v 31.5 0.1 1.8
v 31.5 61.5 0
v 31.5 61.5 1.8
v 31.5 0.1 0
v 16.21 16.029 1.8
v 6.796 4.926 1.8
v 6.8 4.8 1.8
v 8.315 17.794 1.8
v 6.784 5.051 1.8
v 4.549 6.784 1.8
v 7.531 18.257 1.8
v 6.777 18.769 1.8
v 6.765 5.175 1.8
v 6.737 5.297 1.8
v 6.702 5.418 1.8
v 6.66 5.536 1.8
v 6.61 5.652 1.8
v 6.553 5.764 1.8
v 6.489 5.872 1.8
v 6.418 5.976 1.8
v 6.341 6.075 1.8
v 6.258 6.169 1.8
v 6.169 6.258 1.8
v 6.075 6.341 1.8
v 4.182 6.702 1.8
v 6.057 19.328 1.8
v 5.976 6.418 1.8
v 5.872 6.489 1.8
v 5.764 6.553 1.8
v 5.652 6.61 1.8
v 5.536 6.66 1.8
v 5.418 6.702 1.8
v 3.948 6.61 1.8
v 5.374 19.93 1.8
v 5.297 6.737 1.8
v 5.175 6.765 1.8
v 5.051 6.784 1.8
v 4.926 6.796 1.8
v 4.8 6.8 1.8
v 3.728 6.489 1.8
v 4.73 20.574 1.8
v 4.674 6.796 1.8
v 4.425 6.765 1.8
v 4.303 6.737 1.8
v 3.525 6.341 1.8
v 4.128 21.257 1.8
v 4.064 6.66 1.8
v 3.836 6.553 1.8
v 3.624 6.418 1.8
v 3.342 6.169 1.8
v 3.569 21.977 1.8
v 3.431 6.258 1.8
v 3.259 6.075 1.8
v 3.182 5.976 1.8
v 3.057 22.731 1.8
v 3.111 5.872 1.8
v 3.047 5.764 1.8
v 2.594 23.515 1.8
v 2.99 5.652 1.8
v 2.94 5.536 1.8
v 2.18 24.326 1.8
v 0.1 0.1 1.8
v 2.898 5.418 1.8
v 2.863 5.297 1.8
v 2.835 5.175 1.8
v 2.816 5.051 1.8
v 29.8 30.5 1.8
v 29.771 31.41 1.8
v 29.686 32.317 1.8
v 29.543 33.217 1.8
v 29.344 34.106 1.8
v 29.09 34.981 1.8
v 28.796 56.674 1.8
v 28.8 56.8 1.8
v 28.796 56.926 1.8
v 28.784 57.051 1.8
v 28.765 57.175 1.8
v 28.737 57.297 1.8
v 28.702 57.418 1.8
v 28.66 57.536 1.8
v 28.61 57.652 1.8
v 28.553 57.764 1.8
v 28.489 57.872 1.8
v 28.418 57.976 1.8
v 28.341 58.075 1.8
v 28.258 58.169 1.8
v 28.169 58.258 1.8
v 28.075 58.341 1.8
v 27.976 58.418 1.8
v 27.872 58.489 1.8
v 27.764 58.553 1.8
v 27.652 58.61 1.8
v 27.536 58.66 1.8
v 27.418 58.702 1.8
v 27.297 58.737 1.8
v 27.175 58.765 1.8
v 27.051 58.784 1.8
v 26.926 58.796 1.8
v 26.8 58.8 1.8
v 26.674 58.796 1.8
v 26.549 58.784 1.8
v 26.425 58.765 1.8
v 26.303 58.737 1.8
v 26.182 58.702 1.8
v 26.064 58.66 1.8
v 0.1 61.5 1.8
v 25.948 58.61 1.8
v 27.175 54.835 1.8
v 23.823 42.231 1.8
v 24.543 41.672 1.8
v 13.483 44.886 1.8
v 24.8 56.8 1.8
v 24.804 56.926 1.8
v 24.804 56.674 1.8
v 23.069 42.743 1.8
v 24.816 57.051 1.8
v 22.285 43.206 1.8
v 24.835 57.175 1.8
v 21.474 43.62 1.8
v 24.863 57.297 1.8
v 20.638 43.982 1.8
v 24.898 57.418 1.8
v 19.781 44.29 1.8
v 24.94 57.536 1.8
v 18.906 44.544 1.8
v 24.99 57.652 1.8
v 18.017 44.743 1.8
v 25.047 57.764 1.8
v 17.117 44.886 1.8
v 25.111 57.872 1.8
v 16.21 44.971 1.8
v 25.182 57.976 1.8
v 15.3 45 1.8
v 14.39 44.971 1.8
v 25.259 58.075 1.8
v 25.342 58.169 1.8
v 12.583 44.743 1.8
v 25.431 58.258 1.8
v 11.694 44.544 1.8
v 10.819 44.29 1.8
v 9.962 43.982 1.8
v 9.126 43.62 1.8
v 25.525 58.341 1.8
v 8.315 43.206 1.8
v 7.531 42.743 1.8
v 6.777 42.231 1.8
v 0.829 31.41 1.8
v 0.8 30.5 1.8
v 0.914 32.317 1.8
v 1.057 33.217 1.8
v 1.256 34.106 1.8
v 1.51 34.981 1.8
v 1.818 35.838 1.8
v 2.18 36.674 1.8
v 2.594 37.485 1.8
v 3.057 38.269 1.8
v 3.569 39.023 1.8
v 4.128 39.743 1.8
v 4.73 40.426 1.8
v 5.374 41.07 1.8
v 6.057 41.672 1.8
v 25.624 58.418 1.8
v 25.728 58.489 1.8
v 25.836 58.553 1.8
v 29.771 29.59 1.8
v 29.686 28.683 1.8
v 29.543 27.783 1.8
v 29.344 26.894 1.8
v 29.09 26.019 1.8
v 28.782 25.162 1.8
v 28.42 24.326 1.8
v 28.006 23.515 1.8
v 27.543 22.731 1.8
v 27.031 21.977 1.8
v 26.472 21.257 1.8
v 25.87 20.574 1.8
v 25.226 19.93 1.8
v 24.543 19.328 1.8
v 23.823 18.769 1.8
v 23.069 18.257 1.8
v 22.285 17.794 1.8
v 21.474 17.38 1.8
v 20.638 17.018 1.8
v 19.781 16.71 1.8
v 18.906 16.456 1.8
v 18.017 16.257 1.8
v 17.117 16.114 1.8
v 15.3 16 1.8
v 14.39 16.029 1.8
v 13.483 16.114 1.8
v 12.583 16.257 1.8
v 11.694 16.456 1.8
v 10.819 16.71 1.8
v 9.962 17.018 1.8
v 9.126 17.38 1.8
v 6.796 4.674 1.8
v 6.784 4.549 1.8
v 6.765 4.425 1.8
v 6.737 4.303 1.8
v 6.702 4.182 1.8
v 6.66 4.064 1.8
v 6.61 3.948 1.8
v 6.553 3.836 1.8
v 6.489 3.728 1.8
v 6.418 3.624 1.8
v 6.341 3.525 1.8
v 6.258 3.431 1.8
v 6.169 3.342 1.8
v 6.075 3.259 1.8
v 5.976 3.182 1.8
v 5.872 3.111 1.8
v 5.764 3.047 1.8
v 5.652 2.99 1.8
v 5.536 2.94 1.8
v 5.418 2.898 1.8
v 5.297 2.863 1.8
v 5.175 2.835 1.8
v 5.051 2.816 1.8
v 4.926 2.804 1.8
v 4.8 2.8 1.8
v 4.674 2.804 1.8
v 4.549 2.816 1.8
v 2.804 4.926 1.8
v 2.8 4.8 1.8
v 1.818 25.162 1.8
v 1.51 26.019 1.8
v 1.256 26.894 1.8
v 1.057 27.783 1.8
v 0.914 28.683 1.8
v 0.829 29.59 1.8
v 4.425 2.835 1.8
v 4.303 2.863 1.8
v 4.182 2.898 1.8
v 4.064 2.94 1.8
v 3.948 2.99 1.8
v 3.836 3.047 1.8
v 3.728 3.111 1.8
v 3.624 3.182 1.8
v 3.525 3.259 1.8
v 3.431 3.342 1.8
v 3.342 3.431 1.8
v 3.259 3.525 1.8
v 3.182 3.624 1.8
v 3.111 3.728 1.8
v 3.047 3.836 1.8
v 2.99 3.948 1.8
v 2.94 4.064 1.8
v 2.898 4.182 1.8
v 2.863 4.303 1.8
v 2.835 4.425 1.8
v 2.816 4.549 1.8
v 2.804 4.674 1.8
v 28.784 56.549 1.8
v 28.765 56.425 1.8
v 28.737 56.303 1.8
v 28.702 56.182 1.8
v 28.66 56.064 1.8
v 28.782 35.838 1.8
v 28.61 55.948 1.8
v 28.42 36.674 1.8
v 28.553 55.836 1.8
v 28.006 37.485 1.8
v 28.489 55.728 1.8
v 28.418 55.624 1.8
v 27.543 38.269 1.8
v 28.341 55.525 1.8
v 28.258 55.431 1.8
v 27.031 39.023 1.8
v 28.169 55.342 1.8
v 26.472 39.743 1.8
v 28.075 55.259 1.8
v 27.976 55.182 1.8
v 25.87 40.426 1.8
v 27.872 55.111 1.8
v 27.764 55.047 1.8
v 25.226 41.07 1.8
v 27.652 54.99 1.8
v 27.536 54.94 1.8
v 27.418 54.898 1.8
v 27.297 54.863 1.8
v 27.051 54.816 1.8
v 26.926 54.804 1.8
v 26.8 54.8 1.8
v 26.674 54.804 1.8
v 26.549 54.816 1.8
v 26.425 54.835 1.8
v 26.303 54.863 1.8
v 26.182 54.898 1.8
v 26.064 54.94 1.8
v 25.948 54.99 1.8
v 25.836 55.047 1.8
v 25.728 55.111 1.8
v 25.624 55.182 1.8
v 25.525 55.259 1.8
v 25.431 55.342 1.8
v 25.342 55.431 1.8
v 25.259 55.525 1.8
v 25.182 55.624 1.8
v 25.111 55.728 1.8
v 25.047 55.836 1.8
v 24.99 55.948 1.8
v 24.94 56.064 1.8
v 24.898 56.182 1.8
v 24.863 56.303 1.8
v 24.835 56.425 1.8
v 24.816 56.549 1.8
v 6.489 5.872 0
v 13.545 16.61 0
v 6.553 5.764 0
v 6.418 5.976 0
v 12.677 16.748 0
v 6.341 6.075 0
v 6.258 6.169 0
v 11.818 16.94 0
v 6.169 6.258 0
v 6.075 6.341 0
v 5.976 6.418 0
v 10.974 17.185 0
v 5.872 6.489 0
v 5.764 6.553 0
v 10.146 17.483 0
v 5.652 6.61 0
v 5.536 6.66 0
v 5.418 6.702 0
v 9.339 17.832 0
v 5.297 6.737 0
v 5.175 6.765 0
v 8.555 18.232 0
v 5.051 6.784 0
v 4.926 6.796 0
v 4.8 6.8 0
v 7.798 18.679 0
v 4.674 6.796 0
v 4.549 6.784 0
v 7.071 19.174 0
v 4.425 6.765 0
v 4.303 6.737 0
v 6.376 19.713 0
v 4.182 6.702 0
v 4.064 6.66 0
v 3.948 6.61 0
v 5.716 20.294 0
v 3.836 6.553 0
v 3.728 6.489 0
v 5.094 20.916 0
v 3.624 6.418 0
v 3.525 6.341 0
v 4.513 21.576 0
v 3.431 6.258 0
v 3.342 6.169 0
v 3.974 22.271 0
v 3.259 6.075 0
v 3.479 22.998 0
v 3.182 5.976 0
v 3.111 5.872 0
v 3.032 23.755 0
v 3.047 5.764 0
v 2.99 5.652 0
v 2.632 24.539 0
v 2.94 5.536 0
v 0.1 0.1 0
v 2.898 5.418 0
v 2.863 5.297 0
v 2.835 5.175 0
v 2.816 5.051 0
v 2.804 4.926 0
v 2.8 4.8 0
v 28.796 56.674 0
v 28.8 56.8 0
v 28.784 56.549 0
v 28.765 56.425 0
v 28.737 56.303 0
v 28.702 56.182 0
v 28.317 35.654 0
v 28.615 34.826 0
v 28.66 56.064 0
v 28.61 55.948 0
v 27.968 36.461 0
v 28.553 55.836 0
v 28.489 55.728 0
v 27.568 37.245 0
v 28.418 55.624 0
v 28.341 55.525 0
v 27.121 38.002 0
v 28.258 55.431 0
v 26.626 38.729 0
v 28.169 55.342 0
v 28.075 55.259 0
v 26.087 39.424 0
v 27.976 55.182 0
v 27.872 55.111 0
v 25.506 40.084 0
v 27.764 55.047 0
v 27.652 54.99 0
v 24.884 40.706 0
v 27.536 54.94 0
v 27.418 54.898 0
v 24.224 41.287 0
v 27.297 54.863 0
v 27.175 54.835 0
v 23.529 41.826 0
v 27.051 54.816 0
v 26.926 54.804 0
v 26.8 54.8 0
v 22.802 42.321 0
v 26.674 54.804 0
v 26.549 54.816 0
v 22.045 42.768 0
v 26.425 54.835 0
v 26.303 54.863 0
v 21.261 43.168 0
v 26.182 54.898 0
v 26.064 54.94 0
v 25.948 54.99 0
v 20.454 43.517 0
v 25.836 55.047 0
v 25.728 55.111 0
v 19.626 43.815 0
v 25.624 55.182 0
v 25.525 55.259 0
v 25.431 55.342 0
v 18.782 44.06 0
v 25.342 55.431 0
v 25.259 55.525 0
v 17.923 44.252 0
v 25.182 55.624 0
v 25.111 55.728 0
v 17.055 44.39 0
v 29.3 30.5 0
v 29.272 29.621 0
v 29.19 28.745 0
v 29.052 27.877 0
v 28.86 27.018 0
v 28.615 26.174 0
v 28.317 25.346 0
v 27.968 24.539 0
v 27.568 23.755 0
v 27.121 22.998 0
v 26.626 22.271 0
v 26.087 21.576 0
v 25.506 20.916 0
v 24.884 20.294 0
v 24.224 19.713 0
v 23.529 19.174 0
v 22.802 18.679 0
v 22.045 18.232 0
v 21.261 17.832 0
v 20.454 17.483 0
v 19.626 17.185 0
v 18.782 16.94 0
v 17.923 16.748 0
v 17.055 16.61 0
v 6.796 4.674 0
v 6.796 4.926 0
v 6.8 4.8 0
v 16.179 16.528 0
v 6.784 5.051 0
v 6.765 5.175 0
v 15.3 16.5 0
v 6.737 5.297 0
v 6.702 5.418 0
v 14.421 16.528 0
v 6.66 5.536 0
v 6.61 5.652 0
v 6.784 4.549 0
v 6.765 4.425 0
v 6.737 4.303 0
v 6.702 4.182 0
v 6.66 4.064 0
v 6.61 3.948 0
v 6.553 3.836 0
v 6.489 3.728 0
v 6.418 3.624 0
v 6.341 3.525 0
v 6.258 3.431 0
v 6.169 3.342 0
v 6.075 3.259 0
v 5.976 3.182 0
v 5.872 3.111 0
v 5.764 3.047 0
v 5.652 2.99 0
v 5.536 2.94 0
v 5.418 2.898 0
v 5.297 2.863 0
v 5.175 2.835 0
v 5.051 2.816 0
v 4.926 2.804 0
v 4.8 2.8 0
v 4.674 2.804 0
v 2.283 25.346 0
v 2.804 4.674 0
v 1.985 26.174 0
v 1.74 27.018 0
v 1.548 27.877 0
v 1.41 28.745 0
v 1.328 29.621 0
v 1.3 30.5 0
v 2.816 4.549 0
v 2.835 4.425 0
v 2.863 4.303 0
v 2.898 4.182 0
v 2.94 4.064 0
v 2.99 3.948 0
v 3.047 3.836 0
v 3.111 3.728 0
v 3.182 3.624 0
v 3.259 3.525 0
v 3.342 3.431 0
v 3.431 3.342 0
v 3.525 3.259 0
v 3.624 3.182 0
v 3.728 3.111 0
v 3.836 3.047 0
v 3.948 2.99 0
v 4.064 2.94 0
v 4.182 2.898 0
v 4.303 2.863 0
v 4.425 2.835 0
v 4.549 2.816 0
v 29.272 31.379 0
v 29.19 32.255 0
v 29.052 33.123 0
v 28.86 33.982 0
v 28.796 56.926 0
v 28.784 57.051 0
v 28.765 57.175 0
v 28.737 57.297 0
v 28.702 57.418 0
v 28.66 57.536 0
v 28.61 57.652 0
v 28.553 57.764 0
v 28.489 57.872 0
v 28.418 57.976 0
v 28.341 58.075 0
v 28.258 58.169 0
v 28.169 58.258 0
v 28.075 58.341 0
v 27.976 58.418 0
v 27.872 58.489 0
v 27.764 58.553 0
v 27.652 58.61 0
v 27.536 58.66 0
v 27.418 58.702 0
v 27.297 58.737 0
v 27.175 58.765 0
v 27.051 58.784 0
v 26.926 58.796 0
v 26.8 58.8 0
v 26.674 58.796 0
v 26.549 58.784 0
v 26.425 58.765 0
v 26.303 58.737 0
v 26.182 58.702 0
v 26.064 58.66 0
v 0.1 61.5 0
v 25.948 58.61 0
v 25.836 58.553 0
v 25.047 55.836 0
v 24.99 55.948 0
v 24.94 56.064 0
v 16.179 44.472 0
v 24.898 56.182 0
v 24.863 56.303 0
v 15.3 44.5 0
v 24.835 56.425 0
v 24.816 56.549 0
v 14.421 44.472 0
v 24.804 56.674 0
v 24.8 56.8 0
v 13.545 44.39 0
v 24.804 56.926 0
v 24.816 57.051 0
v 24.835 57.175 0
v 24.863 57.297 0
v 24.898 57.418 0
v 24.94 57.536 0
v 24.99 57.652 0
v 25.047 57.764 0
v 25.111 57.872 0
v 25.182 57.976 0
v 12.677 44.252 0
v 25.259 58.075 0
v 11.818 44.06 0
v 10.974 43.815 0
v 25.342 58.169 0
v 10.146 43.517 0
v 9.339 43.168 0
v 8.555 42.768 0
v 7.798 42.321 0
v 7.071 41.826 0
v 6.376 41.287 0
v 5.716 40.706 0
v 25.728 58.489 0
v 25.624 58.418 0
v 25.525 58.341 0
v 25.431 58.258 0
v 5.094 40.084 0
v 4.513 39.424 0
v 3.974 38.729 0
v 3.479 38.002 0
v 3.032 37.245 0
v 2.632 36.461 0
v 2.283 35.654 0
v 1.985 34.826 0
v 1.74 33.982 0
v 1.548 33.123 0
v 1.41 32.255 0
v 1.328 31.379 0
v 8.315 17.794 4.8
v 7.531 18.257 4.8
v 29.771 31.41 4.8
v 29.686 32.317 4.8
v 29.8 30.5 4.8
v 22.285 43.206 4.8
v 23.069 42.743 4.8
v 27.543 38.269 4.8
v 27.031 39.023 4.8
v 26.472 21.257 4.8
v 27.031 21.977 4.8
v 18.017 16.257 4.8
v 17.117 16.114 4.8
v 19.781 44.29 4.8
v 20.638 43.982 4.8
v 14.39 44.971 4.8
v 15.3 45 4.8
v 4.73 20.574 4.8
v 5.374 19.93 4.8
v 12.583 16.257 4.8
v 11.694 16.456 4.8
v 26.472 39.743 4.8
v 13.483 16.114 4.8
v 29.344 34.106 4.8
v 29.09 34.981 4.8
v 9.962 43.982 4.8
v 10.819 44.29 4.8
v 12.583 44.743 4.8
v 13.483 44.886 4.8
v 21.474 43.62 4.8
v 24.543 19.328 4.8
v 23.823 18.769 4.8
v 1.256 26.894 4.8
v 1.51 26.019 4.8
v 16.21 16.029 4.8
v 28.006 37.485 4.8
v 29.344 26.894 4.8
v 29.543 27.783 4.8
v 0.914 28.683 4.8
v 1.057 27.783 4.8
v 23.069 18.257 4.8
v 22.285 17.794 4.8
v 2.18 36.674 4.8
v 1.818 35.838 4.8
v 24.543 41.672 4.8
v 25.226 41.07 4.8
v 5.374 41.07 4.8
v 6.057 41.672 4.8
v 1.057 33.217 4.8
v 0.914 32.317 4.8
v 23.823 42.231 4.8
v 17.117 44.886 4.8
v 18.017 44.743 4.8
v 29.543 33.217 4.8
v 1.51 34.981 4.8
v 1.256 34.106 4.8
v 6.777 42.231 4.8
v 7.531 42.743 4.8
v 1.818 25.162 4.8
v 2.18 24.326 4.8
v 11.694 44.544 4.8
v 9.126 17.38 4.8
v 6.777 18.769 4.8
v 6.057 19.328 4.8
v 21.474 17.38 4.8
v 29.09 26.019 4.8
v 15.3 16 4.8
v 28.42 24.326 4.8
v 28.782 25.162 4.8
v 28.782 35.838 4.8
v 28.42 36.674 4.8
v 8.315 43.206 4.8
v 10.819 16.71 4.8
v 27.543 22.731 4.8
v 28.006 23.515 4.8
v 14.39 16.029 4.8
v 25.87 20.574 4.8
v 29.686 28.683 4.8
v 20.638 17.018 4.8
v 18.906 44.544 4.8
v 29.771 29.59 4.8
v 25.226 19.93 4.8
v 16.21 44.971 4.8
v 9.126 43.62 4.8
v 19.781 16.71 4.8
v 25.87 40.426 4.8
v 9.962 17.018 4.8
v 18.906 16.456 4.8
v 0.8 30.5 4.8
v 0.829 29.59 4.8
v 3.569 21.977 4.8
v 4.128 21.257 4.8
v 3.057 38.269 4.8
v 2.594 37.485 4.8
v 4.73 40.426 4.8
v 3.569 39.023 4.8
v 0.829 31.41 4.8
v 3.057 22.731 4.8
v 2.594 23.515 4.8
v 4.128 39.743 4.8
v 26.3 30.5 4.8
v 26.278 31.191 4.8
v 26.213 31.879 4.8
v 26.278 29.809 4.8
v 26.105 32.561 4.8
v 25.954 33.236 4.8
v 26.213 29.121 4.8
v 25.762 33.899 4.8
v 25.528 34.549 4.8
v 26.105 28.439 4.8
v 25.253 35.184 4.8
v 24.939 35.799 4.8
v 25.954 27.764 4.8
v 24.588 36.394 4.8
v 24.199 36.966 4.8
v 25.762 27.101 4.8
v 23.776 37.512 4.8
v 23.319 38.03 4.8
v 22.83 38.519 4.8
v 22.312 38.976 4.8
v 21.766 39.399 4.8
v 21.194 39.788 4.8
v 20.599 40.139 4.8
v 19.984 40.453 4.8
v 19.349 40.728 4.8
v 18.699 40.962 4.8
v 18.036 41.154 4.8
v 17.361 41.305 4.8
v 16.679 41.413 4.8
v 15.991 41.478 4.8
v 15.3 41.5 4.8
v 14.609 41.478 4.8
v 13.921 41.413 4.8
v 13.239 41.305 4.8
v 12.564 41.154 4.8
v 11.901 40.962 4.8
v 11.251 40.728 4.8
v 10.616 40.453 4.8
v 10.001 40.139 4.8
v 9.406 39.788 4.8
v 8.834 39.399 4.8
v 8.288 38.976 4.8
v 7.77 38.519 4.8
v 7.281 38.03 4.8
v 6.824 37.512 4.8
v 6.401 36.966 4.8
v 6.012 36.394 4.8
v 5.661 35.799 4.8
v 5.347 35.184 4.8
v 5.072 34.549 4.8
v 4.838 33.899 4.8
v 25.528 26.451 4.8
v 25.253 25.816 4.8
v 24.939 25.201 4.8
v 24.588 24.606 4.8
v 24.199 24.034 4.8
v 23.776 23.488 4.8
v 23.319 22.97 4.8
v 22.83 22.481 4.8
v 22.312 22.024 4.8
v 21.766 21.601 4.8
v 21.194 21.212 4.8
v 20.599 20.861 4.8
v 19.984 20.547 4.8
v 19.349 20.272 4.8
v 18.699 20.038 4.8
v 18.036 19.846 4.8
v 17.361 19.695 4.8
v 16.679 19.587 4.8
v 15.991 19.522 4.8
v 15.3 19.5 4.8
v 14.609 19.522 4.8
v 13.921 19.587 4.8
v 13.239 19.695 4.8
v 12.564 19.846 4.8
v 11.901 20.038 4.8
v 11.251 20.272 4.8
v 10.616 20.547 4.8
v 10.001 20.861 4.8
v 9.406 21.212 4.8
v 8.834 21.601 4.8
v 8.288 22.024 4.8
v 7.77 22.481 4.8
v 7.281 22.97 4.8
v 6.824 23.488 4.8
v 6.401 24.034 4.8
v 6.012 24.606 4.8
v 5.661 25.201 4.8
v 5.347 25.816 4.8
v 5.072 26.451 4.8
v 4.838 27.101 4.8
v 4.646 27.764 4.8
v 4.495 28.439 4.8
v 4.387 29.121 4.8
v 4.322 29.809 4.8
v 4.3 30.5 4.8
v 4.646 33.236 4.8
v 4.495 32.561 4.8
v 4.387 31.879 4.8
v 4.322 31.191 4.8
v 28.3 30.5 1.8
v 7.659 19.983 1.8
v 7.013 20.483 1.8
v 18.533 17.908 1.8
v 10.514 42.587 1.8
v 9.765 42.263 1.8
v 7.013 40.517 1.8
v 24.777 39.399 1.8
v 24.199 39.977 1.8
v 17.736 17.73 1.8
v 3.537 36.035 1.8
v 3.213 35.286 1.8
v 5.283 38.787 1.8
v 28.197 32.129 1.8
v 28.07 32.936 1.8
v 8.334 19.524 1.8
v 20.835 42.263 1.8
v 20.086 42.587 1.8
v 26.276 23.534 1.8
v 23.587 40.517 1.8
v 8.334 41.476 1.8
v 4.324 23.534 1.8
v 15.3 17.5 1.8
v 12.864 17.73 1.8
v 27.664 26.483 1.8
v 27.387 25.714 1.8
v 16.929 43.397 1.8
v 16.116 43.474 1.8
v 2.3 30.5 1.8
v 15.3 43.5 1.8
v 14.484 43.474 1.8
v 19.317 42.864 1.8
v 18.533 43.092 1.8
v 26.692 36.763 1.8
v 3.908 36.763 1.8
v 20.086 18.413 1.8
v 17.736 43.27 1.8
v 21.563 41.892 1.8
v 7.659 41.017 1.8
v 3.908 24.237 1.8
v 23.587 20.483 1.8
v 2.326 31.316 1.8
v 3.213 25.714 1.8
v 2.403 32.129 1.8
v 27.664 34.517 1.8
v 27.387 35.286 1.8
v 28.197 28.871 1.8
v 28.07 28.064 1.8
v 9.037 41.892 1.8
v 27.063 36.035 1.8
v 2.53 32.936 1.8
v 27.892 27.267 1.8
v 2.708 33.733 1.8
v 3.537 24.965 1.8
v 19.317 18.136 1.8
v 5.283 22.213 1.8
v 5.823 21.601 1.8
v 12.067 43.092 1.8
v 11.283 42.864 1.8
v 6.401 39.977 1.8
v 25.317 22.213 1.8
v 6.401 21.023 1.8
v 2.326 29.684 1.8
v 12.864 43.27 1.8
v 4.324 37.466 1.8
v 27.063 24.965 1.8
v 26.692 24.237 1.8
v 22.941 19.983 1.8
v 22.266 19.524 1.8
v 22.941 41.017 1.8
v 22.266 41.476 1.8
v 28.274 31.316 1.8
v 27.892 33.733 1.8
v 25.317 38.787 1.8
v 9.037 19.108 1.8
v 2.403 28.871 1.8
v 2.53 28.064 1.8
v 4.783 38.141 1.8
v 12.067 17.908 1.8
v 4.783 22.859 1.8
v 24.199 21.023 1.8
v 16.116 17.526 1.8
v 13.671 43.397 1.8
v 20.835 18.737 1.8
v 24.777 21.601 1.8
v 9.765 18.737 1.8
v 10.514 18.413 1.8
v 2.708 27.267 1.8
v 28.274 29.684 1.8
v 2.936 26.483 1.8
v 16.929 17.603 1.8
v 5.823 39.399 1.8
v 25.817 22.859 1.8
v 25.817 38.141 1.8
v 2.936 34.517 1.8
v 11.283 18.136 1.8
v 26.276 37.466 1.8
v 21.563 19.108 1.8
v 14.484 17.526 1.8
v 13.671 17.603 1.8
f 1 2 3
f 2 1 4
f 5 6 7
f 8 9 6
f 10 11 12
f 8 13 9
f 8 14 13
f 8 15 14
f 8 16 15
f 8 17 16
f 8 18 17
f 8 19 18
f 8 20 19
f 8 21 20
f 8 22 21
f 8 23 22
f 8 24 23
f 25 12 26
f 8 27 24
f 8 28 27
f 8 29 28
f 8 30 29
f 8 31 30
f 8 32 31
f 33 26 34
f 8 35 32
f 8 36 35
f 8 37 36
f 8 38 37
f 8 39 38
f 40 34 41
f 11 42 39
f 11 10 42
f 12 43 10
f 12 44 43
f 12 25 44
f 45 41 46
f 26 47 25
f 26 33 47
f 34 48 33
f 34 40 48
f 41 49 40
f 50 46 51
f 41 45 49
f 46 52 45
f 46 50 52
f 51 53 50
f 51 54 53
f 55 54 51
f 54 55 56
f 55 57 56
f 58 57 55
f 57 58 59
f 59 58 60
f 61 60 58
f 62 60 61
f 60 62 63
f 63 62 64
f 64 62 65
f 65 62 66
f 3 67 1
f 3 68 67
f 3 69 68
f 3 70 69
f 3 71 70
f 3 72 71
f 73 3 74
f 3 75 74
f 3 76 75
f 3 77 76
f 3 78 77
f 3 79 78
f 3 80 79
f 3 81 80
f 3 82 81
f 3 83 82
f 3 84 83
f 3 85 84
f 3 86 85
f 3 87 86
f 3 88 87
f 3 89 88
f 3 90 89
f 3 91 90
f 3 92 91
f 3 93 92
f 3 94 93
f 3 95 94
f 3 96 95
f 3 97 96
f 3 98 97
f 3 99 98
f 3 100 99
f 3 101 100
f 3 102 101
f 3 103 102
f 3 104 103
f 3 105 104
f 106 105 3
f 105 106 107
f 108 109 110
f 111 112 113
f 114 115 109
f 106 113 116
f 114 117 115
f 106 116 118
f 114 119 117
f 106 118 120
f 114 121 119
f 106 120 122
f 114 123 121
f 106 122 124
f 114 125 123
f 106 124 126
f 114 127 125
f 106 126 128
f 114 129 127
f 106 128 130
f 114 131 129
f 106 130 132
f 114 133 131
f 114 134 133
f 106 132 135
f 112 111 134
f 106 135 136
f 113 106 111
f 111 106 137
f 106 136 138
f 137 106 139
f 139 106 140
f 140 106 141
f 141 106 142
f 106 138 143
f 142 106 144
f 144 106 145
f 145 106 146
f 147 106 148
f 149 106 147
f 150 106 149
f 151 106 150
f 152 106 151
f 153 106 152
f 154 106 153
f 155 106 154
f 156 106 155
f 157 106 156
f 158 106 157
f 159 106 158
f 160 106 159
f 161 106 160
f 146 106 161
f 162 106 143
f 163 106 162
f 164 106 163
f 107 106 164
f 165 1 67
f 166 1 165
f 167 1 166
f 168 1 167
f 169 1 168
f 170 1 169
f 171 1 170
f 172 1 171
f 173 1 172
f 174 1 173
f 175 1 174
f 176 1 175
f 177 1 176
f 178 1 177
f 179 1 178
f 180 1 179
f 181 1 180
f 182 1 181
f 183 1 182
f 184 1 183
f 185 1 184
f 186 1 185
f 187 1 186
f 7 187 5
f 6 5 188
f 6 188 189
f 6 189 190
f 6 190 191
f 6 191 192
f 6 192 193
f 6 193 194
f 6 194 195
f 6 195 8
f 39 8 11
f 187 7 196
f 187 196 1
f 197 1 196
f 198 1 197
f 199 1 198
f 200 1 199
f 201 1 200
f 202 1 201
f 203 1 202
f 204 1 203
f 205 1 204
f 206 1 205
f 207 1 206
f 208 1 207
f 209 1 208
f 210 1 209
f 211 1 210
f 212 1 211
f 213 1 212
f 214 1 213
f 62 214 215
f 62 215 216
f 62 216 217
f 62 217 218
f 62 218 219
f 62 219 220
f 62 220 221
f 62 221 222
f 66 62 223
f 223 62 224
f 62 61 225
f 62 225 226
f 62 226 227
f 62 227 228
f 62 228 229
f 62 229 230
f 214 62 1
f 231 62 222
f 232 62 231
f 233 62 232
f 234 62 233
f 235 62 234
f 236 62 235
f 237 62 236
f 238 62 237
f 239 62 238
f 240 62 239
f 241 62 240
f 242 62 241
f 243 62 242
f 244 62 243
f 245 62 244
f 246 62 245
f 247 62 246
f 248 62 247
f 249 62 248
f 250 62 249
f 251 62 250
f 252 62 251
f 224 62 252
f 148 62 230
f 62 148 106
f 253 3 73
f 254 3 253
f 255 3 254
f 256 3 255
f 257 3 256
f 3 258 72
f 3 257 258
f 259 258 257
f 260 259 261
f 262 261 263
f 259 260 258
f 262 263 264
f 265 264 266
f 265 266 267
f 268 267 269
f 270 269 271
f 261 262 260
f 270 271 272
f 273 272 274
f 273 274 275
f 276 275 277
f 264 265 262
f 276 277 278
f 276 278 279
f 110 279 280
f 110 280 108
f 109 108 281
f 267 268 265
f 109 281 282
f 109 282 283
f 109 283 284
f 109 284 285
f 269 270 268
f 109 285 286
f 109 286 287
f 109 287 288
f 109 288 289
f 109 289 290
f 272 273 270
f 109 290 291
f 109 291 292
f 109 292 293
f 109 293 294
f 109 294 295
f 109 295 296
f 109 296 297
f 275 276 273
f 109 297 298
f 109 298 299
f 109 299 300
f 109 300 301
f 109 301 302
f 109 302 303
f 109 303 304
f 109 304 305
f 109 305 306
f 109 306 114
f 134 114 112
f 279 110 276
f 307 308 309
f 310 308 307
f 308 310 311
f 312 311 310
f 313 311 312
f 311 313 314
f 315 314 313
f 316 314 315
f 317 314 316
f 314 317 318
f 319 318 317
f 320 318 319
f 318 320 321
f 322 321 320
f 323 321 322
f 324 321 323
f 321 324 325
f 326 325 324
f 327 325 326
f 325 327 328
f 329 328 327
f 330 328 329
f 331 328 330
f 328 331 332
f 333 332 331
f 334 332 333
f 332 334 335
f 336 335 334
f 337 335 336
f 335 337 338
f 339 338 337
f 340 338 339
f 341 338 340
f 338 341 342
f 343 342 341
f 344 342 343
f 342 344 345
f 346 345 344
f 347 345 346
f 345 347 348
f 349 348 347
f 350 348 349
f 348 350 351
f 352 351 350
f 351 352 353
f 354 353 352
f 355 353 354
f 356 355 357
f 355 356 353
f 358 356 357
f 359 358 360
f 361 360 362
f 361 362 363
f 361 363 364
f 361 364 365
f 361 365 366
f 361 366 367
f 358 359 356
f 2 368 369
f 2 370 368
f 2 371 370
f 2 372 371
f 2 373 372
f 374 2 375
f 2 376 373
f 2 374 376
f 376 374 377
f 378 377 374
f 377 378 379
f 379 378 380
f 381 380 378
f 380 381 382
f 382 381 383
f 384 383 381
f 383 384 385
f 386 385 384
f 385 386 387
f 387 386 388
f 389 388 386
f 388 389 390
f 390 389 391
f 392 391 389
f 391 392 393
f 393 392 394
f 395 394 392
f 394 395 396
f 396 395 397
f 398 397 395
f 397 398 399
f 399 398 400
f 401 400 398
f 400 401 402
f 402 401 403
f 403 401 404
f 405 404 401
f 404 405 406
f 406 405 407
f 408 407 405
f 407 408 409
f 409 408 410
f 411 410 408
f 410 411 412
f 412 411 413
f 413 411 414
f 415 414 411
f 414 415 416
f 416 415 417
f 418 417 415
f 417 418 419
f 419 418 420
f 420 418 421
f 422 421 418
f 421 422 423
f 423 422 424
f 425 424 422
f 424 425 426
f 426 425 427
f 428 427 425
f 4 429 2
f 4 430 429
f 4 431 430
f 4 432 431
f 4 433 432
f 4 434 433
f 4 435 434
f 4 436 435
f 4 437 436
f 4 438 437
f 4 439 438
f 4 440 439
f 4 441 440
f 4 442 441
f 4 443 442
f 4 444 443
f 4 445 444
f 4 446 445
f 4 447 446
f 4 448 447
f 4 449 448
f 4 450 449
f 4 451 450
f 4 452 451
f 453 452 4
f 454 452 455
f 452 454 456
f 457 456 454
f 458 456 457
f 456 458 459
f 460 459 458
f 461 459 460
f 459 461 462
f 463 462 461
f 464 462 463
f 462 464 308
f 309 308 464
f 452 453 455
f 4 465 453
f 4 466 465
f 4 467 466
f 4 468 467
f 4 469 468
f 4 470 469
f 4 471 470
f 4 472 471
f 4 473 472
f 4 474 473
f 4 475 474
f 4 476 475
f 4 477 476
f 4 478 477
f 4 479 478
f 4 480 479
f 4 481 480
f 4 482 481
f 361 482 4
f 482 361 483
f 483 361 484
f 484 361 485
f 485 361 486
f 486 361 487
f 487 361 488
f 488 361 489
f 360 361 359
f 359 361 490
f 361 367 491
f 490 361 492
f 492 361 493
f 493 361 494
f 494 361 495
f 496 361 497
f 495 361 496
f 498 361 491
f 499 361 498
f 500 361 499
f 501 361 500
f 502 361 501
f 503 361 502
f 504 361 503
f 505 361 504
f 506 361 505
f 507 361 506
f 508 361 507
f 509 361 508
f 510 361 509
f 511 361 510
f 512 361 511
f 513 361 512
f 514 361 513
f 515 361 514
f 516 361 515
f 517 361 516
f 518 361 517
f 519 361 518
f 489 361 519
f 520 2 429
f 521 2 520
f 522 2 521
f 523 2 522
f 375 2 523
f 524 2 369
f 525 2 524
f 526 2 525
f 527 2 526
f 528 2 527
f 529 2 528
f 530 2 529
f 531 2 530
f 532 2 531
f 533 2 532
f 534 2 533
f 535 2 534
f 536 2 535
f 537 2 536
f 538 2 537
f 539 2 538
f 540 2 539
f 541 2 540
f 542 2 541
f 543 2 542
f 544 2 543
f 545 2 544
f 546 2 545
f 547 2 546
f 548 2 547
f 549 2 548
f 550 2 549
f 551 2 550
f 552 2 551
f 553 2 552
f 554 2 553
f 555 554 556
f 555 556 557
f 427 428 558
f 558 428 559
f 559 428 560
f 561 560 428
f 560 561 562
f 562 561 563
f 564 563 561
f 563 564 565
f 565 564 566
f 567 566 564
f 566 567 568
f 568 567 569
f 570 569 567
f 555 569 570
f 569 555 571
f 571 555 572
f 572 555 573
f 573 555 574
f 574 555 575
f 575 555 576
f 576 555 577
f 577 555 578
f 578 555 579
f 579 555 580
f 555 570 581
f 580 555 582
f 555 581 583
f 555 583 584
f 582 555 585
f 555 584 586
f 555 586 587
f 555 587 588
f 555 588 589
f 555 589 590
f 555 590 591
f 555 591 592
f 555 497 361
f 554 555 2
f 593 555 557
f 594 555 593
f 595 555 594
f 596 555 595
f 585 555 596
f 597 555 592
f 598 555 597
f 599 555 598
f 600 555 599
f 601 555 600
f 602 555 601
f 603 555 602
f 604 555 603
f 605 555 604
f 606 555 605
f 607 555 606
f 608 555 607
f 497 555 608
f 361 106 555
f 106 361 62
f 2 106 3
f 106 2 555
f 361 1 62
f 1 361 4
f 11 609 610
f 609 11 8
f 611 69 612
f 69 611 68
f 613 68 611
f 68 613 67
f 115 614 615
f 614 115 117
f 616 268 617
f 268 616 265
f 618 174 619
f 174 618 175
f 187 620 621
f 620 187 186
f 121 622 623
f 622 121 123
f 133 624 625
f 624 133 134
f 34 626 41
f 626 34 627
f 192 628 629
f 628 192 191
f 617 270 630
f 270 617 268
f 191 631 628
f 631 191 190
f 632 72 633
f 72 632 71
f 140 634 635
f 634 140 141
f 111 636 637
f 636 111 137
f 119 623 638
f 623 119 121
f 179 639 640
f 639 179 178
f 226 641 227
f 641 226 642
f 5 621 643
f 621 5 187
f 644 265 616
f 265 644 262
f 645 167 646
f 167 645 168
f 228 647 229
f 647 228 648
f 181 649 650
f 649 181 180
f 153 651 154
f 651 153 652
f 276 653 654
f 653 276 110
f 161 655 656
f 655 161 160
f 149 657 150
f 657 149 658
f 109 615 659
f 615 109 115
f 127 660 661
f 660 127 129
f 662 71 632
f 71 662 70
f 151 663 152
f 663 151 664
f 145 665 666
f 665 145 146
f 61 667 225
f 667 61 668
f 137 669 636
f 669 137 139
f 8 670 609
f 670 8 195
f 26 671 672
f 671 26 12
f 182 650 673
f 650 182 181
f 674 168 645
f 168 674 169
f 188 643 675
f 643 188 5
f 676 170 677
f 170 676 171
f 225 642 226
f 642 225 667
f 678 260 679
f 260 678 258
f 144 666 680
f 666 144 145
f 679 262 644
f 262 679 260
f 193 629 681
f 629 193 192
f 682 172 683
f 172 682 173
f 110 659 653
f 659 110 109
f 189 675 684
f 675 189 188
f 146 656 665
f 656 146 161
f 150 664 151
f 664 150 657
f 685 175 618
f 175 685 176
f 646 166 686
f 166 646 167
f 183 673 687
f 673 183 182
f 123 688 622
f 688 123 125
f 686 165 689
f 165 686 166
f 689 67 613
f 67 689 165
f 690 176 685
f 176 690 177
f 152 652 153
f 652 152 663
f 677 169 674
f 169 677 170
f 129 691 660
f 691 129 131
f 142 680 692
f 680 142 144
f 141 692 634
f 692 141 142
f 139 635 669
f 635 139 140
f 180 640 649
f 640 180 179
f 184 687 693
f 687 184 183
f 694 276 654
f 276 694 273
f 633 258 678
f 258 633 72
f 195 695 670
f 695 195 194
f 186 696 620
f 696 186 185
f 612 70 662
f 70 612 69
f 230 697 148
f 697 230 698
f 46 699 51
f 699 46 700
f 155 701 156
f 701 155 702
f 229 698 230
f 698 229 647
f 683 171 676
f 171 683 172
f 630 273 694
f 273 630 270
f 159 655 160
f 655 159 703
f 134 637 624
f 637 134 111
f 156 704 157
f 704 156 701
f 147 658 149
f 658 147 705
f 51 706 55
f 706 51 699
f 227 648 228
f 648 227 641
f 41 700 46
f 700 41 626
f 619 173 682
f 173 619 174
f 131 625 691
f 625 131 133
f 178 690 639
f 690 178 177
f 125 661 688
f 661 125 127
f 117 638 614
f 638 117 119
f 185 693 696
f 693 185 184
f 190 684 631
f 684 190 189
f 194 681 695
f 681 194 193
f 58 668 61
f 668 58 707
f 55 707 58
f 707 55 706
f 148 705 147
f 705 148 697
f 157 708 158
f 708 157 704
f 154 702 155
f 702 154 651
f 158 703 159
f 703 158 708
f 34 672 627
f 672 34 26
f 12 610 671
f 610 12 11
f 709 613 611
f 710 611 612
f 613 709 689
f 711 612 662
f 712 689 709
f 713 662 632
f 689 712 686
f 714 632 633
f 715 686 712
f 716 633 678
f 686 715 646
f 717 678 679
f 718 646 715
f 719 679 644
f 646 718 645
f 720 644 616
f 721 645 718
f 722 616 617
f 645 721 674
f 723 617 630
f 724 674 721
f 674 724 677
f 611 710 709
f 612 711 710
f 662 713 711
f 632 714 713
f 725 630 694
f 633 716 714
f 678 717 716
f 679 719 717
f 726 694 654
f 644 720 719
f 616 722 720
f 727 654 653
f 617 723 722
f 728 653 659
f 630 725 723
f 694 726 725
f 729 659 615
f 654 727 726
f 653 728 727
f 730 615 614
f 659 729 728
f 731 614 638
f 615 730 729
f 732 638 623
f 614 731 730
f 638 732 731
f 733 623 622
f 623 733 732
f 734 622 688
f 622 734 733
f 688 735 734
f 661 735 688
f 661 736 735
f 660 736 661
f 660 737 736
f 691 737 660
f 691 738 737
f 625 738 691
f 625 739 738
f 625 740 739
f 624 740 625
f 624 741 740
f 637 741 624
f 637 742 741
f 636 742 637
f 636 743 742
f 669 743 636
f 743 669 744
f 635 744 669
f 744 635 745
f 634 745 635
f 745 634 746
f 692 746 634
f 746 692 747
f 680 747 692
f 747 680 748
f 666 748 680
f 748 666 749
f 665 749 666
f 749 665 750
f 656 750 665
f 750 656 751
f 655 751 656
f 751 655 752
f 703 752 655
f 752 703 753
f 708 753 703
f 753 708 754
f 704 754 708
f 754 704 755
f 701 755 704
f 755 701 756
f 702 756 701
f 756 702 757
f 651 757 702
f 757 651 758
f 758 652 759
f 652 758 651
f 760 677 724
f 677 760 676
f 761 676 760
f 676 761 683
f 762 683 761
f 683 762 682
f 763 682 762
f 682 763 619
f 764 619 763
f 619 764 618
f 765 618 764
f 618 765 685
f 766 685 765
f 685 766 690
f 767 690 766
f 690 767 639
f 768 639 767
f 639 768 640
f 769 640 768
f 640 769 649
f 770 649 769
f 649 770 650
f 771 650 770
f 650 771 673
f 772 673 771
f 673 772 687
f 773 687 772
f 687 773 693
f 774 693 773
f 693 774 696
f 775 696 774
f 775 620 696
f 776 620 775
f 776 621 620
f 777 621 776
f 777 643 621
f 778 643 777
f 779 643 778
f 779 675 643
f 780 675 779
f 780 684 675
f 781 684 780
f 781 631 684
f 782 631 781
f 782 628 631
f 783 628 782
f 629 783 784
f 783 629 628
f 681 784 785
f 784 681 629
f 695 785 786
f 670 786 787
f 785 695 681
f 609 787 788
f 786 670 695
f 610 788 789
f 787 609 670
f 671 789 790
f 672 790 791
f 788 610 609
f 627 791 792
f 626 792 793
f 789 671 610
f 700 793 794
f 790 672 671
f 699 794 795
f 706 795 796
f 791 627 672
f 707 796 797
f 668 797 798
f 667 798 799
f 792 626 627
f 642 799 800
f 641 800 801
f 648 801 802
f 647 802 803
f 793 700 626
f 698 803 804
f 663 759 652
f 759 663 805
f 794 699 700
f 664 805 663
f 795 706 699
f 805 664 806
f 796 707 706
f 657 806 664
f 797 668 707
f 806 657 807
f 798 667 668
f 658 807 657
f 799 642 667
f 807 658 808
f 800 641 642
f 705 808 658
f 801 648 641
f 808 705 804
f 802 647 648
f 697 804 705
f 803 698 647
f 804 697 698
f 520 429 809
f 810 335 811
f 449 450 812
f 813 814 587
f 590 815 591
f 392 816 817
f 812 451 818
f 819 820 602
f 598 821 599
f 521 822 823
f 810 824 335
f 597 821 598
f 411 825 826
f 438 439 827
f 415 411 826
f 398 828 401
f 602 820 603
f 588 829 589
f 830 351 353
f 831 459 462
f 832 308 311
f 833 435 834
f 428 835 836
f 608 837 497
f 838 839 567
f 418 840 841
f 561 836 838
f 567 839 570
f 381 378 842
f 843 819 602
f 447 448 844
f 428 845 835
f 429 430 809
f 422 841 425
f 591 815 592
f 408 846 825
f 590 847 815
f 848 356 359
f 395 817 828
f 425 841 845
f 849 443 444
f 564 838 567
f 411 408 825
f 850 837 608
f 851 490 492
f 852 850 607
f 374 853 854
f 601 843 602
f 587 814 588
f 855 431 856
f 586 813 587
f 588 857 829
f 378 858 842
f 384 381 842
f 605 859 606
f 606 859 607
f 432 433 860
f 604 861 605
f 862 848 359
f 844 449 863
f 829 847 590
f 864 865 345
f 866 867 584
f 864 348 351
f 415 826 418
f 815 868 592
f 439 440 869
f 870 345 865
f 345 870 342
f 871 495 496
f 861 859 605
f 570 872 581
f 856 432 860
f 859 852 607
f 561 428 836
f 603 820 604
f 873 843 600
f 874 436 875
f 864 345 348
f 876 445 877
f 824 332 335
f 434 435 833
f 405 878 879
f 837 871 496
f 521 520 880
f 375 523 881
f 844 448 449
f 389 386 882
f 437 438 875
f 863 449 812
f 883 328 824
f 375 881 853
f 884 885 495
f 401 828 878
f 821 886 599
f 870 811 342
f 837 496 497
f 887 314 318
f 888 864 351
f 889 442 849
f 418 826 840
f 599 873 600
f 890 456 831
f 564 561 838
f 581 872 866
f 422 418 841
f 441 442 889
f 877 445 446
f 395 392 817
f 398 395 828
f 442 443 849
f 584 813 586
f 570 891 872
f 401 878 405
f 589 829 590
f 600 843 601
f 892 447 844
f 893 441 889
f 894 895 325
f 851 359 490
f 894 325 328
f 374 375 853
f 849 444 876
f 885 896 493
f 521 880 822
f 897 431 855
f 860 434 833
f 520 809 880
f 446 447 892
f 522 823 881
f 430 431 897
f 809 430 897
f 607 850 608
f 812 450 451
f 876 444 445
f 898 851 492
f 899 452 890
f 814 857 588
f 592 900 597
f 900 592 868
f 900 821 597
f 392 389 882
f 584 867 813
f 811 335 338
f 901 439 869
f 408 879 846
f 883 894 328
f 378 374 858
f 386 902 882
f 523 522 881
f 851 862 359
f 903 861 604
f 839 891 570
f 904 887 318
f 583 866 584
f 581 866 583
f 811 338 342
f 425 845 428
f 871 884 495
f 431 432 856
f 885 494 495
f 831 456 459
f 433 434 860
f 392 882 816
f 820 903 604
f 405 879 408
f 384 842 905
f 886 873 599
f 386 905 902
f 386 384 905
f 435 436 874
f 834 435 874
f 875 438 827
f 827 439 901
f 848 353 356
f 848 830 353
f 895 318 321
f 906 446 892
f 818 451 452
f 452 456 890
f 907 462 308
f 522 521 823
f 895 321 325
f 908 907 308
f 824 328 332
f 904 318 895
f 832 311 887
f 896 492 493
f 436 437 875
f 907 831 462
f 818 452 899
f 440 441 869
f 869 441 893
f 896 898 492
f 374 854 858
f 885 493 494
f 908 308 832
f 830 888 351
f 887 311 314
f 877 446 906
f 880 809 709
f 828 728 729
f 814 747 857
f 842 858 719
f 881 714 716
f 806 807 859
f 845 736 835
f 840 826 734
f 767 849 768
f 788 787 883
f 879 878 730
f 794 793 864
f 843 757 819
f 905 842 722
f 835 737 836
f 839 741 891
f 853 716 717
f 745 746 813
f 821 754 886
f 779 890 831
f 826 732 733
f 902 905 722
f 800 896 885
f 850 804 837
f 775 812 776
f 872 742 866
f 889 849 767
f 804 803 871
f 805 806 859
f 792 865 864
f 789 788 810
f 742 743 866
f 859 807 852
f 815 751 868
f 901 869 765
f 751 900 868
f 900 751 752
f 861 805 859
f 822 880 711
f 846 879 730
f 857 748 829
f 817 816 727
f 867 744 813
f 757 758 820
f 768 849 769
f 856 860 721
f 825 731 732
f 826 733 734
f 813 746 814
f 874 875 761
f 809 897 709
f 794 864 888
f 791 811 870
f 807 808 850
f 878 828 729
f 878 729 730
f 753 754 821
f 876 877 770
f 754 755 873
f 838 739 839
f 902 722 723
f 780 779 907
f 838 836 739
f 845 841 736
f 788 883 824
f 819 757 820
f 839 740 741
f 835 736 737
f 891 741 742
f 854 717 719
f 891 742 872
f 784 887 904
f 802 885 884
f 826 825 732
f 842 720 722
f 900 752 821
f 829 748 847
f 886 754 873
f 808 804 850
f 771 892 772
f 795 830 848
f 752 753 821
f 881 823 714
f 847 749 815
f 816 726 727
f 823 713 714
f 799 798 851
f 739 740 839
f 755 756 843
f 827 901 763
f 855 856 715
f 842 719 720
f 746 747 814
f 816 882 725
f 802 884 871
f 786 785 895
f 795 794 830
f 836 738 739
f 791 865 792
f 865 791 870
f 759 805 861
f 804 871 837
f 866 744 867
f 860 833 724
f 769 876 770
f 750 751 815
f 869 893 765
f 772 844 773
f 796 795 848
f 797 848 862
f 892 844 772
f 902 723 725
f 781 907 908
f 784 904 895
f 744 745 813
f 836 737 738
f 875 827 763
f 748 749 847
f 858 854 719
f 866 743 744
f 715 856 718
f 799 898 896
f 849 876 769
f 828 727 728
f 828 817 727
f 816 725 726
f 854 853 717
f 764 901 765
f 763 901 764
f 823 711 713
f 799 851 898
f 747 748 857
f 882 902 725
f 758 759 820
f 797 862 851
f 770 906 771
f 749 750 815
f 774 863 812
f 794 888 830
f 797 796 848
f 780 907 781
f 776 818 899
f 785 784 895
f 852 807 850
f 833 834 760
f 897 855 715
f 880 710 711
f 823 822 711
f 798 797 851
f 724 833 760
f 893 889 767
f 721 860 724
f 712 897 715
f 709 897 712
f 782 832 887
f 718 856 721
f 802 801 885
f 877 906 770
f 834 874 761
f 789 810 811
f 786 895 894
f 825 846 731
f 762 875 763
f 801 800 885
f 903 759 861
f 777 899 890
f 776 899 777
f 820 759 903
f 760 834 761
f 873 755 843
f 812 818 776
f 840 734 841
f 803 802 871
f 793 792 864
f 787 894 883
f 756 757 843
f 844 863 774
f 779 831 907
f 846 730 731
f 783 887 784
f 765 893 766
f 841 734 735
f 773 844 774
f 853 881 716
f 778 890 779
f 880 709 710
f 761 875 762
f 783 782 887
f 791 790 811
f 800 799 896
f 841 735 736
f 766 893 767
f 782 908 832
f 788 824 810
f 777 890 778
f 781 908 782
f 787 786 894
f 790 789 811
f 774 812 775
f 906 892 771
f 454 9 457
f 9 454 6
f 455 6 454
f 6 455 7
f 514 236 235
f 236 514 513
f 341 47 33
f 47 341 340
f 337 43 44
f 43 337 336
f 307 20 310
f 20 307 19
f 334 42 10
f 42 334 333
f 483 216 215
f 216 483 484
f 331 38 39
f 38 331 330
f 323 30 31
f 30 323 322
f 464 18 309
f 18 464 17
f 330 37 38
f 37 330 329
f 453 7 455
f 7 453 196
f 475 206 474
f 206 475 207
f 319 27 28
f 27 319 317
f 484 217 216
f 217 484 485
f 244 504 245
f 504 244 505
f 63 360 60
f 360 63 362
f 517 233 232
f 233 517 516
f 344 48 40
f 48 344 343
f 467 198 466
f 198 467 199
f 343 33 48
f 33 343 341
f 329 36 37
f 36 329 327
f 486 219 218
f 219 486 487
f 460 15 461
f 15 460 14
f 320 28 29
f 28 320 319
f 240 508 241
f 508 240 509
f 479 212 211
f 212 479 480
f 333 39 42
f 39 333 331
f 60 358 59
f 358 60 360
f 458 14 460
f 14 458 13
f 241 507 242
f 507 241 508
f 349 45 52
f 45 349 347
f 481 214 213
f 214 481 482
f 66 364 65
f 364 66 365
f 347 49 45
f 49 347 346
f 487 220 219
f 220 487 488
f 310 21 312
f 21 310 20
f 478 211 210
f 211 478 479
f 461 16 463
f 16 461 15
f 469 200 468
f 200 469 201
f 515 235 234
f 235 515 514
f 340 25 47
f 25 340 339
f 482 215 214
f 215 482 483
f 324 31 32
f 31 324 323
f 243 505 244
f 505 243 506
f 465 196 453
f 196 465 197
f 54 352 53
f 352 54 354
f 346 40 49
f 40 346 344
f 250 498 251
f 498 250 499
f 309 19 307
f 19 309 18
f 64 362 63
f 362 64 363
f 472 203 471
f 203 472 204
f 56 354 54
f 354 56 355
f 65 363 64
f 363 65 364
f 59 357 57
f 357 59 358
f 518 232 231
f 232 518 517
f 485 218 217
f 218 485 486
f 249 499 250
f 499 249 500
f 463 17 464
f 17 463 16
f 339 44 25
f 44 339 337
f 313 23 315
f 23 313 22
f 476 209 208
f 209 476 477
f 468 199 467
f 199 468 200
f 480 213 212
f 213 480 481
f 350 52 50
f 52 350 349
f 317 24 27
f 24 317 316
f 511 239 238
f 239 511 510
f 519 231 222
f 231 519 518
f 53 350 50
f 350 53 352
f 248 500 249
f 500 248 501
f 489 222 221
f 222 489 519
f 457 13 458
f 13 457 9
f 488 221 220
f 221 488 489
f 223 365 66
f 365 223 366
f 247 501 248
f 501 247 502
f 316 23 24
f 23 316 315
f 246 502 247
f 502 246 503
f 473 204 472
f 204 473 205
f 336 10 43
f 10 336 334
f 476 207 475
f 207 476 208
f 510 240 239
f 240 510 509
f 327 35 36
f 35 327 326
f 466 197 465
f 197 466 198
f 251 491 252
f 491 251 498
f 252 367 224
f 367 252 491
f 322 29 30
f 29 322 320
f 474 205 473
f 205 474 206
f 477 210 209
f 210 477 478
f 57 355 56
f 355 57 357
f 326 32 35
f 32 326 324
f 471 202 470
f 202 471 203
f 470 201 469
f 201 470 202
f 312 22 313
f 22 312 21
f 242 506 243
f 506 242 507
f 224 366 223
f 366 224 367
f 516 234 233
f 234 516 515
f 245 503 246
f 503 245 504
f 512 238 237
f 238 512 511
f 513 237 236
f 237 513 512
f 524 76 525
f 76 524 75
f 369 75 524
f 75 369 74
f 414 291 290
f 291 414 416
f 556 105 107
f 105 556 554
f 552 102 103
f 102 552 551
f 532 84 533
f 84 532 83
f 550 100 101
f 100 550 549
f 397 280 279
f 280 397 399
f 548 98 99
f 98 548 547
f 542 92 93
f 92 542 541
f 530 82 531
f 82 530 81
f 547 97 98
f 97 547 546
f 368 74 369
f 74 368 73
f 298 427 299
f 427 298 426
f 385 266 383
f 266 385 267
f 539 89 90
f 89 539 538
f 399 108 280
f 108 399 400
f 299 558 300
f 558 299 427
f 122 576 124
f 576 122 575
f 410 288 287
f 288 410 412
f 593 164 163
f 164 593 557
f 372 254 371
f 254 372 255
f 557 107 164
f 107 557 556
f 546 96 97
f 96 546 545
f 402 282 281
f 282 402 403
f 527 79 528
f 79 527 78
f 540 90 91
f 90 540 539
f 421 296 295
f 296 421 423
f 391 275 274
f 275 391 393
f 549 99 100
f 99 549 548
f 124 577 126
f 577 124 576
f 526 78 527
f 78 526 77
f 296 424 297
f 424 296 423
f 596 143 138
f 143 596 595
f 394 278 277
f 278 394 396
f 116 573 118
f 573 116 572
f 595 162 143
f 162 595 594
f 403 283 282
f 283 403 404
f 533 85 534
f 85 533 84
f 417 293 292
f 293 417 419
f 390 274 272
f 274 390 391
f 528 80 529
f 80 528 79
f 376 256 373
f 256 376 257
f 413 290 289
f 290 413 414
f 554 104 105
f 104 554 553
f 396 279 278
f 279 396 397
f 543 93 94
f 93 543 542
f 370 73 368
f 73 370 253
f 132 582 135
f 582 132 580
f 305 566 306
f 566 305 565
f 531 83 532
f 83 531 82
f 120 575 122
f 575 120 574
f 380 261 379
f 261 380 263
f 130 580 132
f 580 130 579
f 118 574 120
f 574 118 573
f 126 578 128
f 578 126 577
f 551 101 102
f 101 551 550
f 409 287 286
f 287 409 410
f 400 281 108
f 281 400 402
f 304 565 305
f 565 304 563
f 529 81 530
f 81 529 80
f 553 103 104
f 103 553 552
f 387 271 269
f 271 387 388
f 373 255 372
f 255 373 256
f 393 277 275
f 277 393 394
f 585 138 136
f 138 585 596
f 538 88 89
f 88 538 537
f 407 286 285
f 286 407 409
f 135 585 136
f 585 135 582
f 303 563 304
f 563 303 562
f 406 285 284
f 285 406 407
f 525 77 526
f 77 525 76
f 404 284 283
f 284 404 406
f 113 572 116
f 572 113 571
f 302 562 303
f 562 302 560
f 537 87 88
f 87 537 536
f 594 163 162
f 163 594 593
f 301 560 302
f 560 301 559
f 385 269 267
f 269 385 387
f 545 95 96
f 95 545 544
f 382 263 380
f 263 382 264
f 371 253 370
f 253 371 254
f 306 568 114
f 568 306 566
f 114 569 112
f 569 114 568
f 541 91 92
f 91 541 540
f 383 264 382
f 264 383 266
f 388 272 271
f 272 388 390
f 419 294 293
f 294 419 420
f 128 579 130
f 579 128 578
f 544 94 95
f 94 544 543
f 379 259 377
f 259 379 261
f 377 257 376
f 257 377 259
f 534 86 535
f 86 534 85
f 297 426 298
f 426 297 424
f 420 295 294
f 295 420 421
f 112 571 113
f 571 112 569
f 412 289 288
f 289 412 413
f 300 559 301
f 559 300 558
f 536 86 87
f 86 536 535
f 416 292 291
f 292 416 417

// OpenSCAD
$innerX = 30;
$innerY = 60;
$outerZ = 25;
$wall = 2;
$outerDia = 5;
$dentZ = 0;

// vzdalenostni vnitrnich sloupku
$distX=20.1;
$distY=26.5;

// presah vrchniho poklopu
$offset=0.8;

// presah sloupku na poklop
$offset2=4;

module sloupky(h=5,d=8) {
    translate([$distX/2,$distY/2,0]) children();
    translate([-$distX/2,$distY/2,0]) children();
    translate([$distX/2,-$distY/2,0]) children();
    translate([-$distX/2,-$distY/2,0]) children();
}

//!sloupky();

module krabicka_spodek() {
    difference() {
        translate([$outerDia/2,$outerDia/2,$outerDia/2]) minkowski() {
            sphere(d=$outerDia,$fn=50);
            cube([$innerX+$wall*2-$outerDia,$innerY+$wall*2-$outerDia,$outerZ+$outerDia*2]);
        }
        translate([$wall,$wall,$wall]) cube([$innerX,$innerY,$outerZ*2]);
        translate([-1,-1,$outerZ-$dentZ]) cube([$innerX*2,$innerY*2,$outerZ*2]);
    }
}

module spodek() { 
    difference() {
        union() {
            krabicka_spodek();
            
            // tela sloupku
            translate([$wall+$innerX/2,$wall+$innerY/2,$wall]) sloupky() cylinder(d=8,h=5.8,$fn=100);
            
            translate([$wall+$offset2,$wall+$offset2,$wall]) {
                cylinder(r=$offset2,h=$outerZ-$wall,$fn=100);
                translate([-$offset2,-$offset2,0]) cube([$offset2*2,$offset2,$outerZ-$wall]);
                translate([-$offset2,-$offset2,0]) cube([$offset2,$offset2*2,$outerZ-$wall]);
            }
            
            translate([$wall+$innerX-$offset2,$wall+$innerY-$offset2,$wall]) {
                cylinder(r=$offset2,h=$outerZ-$wall,$fn=100);
                translate([-$offset2,0,0]) cube([$offset2*2,$offset2,$outerZ-$wall]);
                translate([0,-$offset2,0]) cube([$offset2,$offset2*2,$outerZ-$wall]);
            }
        }
        
        // dira na kabel
        translate([$wall+$innerX/2-3,$innerY-$wall,$wall+1]) #cube([6,$wall*4,3]);
        
        // diry sloupku
        translate([$wall+$innerX/2,$wall+$innerY/2,-1]) sloupky() {
            cylinder(d=3.3,h=20,$fn=100);
            cylinder(d1=7.3,d2=3.3,h=1+2.2,$fn=100);
        }
        
        // diry v bocnich sloupcich
        translate([$wall+$offset2,$wall+$offset2,-1]) {
            cylinder(d=3.5,h=$outerZ+2,$fn=100);
            cylinder(d=6.6,h=1+2.2,$fn=6);
        }
        translate([$wall+$innerX-$offset2,$wall+$innerY-$offset2,-1]) {
            cylinder(d=3.5,h=$outerZ+2,$fn=100);
            cylinder(d=6.6,h=1+2.2,$fn=6);
        }
        
        // vrsek krabicky
        translate([$wall-$offset,$wall-$offset,$outerZ-1.8]) cube([$innerX+$offset*2,$innerY+$offset*2,2]);
    }
}

$holeKnob = 26;
$centerOffsetX = 3.8+23/2;
$centerOffsetY = 19+23/2;

module vrsekStred(z=0) {
    translate([$centerOffsetX,$centerOffsetY,z]) children();
}

module vrsek() {
    difference() {
        union() {
            translate([0.1,0.1,0]) cube([$innerX+$offset*2-0.2,$innerY+$offset*2-0.2,1.8]);
            vrsekStred(1.8) cylinder(d=$holeKnob+3,h=3,$fn=100);
        }
        vrsekStred(0) cylinder(d1=28,d2=$holeKnob,h=1.8,$fn=100);
        vrsekStred(1.8) cylinder(d1=$holeKnob,d2=22,h=3,$fn=100);
        
        translate([$offset2+$offset,$offset2+$offset,-1]) cylinder(d=4,h=3,$fn=100);
        translate([$innerX-$offset2+$offset,$innerY-$offset2+$offset,-1]) cylinder(d=4,h=3,$fn=100);
    }
}

translate([-$wall+$offset,-$wall+$offset,-$outerZ+1.8]) spodek();
!vrsek();
